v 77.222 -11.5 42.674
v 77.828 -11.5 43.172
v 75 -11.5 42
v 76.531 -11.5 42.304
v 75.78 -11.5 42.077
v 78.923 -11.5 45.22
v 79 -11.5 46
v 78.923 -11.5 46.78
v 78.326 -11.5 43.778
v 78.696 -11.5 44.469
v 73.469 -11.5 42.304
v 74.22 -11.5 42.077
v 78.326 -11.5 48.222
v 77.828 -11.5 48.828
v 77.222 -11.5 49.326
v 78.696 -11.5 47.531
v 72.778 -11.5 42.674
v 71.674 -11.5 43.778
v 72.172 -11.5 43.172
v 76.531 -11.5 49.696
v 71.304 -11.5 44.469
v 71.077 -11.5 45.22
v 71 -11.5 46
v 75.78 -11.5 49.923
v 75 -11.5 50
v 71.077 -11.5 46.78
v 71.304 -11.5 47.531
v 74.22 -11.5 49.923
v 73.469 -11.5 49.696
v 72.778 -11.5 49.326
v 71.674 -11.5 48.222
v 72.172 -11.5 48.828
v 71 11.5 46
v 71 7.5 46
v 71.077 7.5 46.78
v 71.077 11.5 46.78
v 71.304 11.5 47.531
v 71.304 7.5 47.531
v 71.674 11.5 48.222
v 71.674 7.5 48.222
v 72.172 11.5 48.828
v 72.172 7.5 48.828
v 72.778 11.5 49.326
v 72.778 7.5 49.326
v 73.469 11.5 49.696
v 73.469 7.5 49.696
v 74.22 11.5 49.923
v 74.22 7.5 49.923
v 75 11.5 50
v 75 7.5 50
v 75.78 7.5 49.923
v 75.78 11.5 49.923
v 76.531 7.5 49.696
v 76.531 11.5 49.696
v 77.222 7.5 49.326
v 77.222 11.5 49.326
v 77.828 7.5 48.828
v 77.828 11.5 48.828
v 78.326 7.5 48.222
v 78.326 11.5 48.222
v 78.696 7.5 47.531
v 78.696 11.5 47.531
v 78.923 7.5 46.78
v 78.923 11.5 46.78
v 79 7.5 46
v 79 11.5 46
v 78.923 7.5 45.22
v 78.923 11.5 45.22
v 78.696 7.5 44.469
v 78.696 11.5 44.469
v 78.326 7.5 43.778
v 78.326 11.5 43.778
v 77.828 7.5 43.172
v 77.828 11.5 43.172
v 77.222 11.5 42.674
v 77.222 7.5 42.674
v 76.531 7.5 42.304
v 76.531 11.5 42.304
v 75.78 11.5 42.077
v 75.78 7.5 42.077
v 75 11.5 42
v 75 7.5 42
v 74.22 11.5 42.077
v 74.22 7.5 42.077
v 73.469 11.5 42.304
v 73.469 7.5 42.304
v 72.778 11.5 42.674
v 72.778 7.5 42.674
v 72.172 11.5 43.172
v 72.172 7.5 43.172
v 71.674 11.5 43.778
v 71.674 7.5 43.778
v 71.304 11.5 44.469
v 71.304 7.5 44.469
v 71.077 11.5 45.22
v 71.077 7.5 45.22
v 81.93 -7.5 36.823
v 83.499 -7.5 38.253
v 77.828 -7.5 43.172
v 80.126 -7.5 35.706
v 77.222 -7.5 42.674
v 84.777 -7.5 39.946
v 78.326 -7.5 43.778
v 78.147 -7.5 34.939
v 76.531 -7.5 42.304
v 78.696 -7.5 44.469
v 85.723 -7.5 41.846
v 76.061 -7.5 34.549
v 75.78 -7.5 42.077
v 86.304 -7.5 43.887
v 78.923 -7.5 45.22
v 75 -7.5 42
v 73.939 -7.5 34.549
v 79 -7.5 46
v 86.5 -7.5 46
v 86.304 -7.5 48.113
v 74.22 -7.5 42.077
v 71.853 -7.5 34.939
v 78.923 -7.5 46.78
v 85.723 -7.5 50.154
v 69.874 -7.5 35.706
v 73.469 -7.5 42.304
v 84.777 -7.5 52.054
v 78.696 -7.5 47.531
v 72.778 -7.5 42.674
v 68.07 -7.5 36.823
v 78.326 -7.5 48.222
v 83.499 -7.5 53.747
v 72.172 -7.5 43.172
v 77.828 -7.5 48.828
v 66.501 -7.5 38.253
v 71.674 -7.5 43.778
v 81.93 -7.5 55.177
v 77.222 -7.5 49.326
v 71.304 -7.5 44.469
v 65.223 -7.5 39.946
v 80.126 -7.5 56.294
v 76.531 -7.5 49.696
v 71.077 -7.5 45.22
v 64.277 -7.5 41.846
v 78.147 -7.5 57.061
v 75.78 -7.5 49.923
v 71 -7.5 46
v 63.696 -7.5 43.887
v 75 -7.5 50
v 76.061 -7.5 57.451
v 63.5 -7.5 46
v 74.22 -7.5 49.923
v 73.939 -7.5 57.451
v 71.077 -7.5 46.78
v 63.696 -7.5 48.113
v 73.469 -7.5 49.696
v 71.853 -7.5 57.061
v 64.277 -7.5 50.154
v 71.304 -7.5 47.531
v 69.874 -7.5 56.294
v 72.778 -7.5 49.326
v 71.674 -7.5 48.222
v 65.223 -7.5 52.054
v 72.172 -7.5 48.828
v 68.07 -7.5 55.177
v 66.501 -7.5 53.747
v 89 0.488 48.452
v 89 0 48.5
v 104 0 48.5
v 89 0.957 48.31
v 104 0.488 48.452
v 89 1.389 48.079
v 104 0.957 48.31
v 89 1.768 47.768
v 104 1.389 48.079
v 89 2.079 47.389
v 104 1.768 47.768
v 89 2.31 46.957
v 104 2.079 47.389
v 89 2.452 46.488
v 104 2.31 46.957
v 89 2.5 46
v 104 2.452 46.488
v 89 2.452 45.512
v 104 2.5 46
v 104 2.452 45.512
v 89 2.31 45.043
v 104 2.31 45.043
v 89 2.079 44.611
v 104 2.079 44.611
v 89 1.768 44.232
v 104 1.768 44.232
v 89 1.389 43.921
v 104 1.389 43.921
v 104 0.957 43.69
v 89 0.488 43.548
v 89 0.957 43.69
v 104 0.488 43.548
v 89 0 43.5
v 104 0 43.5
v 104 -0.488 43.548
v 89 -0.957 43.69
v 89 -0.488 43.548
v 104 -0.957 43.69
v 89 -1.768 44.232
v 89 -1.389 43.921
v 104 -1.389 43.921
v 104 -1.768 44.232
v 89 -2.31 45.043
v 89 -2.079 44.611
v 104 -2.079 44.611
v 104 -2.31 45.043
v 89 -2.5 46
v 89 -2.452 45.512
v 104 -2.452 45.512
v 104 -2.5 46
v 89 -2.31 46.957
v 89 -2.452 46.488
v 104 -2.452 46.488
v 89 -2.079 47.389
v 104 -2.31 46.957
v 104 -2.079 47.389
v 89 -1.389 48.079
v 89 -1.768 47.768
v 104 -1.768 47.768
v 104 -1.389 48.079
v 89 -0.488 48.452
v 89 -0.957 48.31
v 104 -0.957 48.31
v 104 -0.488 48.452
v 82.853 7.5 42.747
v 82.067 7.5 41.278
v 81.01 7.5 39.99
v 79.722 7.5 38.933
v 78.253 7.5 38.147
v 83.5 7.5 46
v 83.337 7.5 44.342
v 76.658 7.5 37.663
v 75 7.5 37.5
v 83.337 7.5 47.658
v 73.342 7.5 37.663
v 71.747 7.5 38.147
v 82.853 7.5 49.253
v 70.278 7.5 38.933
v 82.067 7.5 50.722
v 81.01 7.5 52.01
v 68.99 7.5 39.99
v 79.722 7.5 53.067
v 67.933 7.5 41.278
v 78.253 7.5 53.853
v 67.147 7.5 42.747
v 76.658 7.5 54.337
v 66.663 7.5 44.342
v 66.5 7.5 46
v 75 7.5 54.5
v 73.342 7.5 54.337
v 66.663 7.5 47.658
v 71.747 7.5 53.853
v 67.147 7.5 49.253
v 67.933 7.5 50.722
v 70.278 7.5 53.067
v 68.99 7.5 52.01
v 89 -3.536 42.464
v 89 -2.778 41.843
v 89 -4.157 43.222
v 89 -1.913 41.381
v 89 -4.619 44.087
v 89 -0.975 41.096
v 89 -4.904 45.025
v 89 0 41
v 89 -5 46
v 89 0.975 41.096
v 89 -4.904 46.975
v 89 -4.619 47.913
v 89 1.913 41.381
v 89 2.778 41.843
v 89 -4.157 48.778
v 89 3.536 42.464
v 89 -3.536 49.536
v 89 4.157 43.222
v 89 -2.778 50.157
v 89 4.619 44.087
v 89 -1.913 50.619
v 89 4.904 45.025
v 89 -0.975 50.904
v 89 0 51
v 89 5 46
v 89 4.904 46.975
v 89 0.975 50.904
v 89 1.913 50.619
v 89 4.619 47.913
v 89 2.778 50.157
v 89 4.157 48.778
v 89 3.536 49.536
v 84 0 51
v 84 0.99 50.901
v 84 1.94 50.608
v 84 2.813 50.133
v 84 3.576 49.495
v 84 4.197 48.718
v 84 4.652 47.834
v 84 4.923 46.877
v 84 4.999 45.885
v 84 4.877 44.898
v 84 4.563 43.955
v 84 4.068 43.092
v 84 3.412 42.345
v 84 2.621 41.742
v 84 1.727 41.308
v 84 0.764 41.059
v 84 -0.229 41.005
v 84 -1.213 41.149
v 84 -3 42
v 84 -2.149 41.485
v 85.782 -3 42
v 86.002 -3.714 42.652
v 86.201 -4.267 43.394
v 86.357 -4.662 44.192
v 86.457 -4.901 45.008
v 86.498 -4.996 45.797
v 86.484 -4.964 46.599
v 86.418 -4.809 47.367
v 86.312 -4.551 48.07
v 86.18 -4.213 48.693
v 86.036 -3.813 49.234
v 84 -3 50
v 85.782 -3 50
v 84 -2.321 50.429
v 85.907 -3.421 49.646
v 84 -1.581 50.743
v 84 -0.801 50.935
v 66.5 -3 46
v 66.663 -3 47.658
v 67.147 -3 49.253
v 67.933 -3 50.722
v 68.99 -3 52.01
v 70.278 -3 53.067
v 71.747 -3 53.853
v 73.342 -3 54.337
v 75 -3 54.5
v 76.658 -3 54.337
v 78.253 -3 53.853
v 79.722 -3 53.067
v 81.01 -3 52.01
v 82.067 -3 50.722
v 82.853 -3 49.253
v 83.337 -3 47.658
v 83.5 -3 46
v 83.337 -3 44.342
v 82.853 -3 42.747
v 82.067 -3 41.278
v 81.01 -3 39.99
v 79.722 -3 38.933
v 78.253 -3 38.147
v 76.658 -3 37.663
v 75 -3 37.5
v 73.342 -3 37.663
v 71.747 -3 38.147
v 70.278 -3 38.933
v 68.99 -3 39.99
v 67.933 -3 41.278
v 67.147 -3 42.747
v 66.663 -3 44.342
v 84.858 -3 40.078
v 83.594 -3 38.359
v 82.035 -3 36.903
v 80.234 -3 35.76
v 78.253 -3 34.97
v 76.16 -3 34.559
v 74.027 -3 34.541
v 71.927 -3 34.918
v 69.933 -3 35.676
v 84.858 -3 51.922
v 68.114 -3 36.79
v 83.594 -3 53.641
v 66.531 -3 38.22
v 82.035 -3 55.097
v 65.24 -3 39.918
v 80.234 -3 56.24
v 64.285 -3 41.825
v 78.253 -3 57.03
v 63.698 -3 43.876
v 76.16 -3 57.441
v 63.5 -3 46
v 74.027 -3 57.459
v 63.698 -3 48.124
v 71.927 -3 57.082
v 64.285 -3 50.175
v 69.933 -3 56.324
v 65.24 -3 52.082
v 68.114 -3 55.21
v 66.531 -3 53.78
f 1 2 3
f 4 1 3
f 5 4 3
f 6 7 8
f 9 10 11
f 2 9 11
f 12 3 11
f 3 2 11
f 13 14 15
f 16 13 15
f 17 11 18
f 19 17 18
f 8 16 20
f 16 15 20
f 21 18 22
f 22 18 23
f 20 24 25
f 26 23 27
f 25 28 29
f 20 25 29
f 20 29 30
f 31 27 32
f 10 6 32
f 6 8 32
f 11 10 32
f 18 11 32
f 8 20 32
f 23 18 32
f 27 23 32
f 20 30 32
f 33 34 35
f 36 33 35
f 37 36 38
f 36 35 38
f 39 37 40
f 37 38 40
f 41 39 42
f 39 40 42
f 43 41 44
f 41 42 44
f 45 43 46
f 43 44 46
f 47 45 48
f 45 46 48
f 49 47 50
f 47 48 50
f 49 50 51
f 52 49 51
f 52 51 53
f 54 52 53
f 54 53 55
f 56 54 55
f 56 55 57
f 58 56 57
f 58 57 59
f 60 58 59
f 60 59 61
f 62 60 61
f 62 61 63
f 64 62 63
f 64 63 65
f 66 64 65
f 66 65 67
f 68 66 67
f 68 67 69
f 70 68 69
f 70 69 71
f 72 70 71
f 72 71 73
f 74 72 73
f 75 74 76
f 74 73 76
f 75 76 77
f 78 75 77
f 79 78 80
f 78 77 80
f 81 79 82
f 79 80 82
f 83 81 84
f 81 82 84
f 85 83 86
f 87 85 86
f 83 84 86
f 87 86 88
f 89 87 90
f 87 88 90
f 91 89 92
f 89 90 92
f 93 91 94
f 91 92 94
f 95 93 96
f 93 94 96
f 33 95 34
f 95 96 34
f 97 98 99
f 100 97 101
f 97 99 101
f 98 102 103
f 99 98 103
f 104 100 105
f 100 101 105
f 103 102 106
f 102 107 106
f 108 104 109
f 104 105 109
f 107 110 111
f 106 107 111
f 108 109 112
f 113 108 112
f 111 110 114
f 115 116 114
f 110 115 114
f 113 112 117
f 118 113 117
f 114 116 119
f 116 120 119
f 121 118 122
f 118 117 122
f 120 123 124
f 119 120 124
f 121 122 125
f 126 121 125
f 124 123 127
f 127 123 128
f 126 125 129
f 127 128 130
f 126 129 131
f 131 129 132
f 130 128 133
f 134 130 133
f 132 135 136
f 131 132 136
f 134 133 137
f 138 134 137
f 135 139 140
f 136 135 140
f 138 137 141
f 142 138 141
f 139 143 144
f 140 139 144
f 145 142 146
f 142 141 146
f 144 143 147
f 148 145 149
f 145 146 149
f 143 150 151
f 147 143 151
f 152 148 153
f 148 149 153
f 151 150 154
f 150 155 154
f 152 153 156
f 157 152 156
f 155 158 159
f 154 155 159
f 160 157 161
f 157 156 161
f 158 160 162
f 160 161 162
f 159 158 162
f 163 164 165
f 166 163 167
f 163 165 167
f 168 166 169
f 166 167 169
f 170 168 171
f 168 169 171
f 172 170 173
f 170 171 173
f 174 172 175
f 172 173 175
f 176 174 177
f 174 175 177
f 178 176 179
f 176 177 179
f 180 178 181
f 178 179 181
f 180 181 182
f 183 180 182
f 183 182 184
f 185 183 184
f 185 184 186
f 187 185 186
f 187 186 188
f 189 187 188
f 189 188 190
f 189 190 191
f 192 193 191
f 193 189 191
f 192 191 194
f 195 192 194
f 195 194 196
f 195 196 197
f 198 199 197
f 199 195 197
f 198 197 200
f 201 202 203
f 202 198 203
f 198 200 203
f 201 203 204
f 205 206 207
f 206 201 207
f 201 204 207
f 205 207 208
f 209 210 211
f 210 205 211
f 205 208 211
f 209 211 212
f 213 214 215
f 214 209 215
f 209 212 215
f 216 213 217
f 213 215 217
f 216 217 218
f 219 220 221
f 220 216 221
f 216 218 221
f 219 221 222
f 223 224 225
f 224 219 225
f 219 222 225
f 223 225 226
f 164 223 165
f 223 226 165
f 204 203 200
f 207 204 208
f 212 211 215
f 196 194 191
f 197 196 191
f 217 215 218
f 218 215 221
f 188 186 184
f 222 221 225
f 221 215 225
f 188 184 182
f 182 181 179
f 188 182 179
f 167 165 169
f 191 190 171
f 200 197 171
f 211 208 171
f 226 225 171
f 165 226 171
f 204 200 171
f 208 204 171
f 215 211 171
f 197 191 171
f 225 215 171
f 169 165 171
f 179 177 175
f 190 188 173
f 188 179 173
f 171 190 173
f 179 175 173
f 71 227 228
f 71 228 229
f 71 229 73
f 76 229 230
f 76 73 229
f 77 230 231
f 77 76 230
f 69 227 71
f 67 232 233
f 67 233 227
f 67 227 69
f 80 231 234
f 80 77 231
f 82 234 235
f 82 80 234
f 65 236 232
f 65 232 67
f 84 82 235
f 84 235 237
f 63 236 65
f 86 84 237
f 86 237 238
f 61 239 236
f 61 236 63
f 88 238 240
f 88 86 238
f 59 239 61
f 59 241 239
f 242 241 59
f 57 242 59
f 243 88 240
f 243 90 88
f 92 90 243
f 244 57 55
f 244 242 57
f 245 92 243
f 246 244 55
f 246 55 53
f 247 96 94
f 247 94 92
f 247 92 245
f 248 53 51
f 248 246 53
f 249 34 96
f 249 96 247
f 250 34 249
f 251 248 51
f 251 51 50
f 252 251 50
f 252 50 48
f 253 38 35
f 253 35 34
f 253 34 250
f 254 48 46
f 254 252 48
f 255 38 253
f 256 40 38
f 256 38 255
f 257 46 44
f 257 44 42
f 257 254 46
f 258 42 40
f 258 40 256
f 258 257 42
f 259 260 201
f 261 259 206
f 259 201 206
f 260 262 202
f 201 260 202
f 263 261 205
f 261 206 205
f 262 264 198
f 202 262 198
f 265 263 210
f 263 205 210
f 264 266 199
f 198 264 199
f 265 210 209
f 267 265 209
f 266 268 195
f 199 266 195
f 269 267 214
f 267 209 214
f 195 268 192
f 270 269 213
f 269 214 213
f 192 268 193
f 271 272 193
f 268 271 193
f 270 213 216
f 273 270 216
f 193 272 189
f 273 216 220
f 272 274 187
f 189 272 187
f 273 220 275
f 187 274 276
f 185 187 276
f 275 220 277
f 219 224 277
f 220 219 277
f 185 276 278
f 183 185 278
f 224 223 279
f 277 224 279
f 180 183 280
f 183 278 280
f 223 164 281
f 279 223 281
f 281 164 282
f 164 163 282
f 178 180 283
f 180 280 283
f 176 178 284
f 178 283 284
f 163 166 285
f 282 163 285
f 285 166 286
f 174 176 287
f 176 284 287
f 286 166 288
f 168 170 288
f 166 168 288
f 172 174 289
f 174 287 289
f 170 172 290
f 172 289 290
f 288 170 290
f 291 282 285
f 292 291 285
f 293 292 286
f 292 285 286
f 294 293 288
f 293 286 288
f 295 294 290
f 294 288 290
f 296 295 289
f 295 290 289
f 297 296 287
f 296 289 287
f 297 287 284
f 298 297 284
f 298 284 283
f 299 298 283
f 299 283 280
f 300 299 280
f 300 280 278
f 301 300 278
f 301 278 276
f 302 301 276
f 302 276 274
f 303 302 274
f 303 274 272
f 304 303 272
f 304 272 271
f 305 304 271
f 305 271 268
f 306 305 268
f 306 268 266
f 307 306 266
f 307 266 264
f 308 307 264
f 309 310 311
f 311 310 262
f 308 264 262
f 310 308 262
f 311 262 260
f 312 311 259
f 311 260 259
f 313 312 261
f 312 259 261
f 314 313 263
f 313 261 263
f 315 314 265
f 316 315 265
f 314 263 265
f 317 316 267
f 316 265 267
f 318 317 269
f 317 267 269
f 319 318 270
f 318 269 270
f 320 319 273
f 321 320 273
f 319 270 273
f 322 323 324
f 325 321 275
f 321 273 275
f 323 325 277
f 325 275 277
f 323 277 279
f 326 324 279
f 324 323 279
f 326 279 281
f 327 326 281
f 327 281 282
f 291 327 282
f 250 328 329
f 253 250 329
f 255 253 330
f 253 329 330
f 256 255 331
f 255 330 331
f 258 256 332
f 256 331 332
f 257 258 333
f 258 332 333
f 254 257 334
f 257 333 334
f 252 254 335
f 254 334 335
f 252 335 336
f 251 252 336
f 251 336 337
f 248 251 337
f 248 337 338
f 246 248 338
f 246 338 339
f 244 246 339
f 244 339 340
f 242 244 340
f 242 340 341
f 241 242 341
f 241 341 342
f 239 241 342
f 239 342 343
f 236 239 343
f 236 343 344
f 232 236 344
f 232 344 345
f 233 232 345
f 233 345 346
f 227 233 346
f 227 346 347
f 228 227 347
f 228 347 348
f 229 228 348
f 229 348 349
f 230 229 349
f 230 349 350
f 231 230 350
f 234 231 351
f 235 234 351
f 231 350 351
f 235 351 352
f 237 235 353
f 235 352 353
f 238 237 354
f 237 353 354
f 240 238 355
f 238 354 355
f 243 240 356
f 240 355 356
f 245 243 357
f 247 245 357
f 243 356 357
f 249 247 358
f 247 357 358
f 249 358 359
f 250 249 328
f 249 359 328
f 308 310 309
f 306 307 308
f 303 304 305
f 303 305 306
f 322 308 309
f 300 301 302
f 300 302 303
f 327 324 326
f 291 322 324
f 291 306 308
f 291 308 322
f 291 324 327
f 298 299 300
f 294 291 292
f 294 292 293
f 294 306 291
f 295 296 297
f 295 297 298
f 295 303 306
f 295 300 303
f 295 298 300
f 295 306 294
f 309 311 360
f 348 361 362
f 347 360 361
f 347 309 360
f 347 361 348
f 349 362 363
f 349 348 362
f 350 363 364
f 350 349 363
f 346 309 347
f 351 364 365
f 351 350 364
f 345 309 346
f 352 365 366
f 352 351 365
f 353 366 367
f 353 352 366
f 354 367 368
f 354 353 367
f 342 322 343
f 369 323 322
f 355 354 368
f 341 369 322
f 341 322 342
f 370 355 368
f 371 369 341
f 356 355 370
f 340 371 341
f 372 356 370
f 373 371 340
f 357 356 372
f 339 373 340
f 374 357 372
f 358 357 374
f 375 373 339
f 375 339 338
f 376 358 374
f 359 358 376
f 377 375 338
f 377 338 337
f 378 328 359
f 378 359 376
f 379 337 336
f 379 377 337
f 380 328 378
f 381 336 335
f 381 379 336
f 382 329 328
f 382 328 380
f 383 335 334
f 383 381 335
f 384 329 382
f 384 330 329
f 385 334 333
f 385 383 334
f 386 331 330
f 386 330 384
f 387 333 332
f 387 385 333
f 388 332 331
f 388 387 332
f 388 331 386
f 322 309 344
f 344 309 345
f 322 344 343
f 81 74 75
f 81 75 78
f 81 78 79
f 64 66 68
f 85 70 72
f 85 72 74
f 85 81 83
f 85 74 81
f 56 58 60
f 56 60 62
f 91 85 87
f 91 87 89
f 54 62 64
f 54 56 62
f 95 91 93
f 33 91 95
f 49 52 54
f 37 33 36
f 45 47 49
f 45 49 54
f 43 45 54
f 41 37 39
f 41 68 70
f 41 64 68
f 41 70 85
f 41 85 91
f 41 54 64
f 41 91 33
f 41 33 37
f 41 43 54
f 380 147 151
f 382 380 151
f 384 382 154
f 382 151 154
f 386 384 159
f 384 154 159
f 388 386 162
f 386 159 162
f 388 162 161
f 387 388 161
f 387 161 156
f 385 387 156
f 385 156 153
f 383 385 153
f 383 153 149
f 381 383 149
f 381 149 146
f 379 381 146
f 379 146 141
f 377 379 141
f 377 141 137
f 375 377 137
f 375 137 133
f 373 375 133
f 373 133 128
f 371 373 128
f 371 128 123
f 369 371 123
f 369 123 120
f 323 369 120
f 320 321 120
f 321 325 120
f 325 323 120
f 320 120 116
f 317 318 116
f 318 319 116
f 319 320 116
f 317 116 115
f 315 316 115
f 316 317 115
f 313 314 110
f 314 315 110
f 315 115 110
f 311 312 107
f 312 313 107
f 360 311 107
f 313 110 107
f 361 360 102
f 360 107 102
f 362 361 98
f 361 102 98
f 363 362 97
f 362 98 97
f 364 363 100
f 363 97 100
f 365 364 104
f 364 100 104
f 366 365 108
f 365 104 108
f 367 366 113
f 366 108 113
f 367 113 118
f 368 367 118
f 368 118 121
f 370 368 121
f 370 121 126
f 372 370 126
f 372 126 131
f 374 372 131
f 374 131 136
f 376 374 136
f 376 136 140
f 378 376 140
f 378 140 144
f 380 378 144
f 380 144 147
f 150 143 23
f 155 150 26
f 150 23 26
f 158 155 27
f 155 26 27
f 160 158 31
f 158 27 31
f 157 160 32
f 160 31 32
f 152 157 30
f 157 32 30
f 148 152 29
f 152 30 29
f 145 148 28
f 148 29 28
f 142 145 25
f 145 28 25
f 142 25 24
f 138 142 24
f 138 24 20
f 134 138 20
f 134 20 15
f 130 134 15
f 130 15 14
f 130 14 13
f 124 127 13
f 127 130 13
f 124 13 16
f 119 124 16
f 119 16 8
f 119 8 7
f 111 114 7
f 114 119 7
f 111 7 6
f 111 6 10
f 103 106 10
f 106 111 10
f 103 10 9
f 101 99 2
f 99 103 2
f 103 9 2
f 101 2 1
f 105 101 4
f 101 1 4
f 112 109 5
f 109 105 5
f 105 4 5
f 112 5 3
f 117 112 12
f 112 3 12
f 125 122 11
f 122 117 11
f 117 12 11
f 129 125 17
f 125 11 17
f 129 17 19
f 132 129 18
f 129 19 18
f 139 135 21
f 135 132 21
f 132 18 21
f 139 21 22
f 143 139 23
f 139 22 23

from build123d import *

# Parameters (mm, degrees)
CYLINDER203_R             = 5
CYLINDER203_DEPTH         = 5
CYLINDER204_R             = 2.5
CYLINDER204_DEPTH         = 20
CYLINDER001_R             = 11.5
CYLINDER001_DEPTH         = 4.5
CYLINDER002_R             = 4
CYLINDER002_DEPTH         = 23
CYLINDER_R                = 8.5
CYLINDER_DEPTH            = 15
FUSION_PLACEMENT_ANGLE    = 90
FUSION041_PLACEMENT_ANGLE = 180


with BuildPart() as cylinder203:
    # Cylinder203 → Cylinder203 (new body)
    with BuildSketch(Plane(origin=(15, 0, 0), x_dir=(0, 0, -1), z_dir=(1, 0, 0))):
        Circle(CYLINDER203_R)
    extrude(amount=CYLINDER203_DEPTH)


with BuildPart() as pinion:
    # Cylinder204 → Cylinder204 (new body)
    with BuildSketch(Plane(origin=(0, 0, 0), x_dir=(0, 0, -1), z_dir=(1, 0, 0))):
        Circle(CYLINDER204_R)
    extrude(amount=CYLINDER204_DEPTH)

    # Fusion040: union Cylinder203
    add(cylinder203.part)


with BuildPart() as pinion_1:
    # Fusion040 placement: moved
    add(pinion.part.moved(Location((-21.5, 54.5, 7.5))))


with BuildPart() as cylinder001:
    # Cylinder001 → Cylinder001 (new body)
    with BuildSketch(Plane.XY.offset(-1)):
        Circle(CYLINDER001_R)
    extrude(amount=CYLINDER001_DEPTH)


with BuildPart() as cylinder002:
    # Cylinder002 → Cylinder002 (new body)
    with BuildSketch(Plane.XY.offset(-5)):
        Circle(CYLINDER002_R)
    extrude(amount=CYLINDER002_DEPTH)


with BuildPart() as differential_pinion:
    # Cylinder → Cylinder (new body)
    with BuildSketch(Plane.XY.offset(-1)):
        Circle(CYLINDER_R)
    extrude(amount=CYLINDER_DEPTH)

    # Fusion: union Cylinder001, Cylinder002
    add(cylinder001.part)
    add(cylinder002.part)


with BuildPart() as differential_pinion_1:
    # Fusion placement: moved
    add(differential_pinion.part.moved(Location((7.5, 48, 7.5))).rotate(Axis((7.5, 48, 7.5), (-1, 0, 0)), FUSION_PLACEMENT_ANGLE))

    # Fusion041: union pinion
    add(pinion_1.part)


with BuildPart() as differential_pinion_2:
    # Fusion041 placement: moved
    add(differential_pinion_1.part.moved(Location((82.5, -54.5, 53.5))).rotate(Axis((82.5, -54.5, 53.5), (0, 1, 0)), FUSION041_PLACEMENT_ANGLE))


solid = differential_pinion_2.part
